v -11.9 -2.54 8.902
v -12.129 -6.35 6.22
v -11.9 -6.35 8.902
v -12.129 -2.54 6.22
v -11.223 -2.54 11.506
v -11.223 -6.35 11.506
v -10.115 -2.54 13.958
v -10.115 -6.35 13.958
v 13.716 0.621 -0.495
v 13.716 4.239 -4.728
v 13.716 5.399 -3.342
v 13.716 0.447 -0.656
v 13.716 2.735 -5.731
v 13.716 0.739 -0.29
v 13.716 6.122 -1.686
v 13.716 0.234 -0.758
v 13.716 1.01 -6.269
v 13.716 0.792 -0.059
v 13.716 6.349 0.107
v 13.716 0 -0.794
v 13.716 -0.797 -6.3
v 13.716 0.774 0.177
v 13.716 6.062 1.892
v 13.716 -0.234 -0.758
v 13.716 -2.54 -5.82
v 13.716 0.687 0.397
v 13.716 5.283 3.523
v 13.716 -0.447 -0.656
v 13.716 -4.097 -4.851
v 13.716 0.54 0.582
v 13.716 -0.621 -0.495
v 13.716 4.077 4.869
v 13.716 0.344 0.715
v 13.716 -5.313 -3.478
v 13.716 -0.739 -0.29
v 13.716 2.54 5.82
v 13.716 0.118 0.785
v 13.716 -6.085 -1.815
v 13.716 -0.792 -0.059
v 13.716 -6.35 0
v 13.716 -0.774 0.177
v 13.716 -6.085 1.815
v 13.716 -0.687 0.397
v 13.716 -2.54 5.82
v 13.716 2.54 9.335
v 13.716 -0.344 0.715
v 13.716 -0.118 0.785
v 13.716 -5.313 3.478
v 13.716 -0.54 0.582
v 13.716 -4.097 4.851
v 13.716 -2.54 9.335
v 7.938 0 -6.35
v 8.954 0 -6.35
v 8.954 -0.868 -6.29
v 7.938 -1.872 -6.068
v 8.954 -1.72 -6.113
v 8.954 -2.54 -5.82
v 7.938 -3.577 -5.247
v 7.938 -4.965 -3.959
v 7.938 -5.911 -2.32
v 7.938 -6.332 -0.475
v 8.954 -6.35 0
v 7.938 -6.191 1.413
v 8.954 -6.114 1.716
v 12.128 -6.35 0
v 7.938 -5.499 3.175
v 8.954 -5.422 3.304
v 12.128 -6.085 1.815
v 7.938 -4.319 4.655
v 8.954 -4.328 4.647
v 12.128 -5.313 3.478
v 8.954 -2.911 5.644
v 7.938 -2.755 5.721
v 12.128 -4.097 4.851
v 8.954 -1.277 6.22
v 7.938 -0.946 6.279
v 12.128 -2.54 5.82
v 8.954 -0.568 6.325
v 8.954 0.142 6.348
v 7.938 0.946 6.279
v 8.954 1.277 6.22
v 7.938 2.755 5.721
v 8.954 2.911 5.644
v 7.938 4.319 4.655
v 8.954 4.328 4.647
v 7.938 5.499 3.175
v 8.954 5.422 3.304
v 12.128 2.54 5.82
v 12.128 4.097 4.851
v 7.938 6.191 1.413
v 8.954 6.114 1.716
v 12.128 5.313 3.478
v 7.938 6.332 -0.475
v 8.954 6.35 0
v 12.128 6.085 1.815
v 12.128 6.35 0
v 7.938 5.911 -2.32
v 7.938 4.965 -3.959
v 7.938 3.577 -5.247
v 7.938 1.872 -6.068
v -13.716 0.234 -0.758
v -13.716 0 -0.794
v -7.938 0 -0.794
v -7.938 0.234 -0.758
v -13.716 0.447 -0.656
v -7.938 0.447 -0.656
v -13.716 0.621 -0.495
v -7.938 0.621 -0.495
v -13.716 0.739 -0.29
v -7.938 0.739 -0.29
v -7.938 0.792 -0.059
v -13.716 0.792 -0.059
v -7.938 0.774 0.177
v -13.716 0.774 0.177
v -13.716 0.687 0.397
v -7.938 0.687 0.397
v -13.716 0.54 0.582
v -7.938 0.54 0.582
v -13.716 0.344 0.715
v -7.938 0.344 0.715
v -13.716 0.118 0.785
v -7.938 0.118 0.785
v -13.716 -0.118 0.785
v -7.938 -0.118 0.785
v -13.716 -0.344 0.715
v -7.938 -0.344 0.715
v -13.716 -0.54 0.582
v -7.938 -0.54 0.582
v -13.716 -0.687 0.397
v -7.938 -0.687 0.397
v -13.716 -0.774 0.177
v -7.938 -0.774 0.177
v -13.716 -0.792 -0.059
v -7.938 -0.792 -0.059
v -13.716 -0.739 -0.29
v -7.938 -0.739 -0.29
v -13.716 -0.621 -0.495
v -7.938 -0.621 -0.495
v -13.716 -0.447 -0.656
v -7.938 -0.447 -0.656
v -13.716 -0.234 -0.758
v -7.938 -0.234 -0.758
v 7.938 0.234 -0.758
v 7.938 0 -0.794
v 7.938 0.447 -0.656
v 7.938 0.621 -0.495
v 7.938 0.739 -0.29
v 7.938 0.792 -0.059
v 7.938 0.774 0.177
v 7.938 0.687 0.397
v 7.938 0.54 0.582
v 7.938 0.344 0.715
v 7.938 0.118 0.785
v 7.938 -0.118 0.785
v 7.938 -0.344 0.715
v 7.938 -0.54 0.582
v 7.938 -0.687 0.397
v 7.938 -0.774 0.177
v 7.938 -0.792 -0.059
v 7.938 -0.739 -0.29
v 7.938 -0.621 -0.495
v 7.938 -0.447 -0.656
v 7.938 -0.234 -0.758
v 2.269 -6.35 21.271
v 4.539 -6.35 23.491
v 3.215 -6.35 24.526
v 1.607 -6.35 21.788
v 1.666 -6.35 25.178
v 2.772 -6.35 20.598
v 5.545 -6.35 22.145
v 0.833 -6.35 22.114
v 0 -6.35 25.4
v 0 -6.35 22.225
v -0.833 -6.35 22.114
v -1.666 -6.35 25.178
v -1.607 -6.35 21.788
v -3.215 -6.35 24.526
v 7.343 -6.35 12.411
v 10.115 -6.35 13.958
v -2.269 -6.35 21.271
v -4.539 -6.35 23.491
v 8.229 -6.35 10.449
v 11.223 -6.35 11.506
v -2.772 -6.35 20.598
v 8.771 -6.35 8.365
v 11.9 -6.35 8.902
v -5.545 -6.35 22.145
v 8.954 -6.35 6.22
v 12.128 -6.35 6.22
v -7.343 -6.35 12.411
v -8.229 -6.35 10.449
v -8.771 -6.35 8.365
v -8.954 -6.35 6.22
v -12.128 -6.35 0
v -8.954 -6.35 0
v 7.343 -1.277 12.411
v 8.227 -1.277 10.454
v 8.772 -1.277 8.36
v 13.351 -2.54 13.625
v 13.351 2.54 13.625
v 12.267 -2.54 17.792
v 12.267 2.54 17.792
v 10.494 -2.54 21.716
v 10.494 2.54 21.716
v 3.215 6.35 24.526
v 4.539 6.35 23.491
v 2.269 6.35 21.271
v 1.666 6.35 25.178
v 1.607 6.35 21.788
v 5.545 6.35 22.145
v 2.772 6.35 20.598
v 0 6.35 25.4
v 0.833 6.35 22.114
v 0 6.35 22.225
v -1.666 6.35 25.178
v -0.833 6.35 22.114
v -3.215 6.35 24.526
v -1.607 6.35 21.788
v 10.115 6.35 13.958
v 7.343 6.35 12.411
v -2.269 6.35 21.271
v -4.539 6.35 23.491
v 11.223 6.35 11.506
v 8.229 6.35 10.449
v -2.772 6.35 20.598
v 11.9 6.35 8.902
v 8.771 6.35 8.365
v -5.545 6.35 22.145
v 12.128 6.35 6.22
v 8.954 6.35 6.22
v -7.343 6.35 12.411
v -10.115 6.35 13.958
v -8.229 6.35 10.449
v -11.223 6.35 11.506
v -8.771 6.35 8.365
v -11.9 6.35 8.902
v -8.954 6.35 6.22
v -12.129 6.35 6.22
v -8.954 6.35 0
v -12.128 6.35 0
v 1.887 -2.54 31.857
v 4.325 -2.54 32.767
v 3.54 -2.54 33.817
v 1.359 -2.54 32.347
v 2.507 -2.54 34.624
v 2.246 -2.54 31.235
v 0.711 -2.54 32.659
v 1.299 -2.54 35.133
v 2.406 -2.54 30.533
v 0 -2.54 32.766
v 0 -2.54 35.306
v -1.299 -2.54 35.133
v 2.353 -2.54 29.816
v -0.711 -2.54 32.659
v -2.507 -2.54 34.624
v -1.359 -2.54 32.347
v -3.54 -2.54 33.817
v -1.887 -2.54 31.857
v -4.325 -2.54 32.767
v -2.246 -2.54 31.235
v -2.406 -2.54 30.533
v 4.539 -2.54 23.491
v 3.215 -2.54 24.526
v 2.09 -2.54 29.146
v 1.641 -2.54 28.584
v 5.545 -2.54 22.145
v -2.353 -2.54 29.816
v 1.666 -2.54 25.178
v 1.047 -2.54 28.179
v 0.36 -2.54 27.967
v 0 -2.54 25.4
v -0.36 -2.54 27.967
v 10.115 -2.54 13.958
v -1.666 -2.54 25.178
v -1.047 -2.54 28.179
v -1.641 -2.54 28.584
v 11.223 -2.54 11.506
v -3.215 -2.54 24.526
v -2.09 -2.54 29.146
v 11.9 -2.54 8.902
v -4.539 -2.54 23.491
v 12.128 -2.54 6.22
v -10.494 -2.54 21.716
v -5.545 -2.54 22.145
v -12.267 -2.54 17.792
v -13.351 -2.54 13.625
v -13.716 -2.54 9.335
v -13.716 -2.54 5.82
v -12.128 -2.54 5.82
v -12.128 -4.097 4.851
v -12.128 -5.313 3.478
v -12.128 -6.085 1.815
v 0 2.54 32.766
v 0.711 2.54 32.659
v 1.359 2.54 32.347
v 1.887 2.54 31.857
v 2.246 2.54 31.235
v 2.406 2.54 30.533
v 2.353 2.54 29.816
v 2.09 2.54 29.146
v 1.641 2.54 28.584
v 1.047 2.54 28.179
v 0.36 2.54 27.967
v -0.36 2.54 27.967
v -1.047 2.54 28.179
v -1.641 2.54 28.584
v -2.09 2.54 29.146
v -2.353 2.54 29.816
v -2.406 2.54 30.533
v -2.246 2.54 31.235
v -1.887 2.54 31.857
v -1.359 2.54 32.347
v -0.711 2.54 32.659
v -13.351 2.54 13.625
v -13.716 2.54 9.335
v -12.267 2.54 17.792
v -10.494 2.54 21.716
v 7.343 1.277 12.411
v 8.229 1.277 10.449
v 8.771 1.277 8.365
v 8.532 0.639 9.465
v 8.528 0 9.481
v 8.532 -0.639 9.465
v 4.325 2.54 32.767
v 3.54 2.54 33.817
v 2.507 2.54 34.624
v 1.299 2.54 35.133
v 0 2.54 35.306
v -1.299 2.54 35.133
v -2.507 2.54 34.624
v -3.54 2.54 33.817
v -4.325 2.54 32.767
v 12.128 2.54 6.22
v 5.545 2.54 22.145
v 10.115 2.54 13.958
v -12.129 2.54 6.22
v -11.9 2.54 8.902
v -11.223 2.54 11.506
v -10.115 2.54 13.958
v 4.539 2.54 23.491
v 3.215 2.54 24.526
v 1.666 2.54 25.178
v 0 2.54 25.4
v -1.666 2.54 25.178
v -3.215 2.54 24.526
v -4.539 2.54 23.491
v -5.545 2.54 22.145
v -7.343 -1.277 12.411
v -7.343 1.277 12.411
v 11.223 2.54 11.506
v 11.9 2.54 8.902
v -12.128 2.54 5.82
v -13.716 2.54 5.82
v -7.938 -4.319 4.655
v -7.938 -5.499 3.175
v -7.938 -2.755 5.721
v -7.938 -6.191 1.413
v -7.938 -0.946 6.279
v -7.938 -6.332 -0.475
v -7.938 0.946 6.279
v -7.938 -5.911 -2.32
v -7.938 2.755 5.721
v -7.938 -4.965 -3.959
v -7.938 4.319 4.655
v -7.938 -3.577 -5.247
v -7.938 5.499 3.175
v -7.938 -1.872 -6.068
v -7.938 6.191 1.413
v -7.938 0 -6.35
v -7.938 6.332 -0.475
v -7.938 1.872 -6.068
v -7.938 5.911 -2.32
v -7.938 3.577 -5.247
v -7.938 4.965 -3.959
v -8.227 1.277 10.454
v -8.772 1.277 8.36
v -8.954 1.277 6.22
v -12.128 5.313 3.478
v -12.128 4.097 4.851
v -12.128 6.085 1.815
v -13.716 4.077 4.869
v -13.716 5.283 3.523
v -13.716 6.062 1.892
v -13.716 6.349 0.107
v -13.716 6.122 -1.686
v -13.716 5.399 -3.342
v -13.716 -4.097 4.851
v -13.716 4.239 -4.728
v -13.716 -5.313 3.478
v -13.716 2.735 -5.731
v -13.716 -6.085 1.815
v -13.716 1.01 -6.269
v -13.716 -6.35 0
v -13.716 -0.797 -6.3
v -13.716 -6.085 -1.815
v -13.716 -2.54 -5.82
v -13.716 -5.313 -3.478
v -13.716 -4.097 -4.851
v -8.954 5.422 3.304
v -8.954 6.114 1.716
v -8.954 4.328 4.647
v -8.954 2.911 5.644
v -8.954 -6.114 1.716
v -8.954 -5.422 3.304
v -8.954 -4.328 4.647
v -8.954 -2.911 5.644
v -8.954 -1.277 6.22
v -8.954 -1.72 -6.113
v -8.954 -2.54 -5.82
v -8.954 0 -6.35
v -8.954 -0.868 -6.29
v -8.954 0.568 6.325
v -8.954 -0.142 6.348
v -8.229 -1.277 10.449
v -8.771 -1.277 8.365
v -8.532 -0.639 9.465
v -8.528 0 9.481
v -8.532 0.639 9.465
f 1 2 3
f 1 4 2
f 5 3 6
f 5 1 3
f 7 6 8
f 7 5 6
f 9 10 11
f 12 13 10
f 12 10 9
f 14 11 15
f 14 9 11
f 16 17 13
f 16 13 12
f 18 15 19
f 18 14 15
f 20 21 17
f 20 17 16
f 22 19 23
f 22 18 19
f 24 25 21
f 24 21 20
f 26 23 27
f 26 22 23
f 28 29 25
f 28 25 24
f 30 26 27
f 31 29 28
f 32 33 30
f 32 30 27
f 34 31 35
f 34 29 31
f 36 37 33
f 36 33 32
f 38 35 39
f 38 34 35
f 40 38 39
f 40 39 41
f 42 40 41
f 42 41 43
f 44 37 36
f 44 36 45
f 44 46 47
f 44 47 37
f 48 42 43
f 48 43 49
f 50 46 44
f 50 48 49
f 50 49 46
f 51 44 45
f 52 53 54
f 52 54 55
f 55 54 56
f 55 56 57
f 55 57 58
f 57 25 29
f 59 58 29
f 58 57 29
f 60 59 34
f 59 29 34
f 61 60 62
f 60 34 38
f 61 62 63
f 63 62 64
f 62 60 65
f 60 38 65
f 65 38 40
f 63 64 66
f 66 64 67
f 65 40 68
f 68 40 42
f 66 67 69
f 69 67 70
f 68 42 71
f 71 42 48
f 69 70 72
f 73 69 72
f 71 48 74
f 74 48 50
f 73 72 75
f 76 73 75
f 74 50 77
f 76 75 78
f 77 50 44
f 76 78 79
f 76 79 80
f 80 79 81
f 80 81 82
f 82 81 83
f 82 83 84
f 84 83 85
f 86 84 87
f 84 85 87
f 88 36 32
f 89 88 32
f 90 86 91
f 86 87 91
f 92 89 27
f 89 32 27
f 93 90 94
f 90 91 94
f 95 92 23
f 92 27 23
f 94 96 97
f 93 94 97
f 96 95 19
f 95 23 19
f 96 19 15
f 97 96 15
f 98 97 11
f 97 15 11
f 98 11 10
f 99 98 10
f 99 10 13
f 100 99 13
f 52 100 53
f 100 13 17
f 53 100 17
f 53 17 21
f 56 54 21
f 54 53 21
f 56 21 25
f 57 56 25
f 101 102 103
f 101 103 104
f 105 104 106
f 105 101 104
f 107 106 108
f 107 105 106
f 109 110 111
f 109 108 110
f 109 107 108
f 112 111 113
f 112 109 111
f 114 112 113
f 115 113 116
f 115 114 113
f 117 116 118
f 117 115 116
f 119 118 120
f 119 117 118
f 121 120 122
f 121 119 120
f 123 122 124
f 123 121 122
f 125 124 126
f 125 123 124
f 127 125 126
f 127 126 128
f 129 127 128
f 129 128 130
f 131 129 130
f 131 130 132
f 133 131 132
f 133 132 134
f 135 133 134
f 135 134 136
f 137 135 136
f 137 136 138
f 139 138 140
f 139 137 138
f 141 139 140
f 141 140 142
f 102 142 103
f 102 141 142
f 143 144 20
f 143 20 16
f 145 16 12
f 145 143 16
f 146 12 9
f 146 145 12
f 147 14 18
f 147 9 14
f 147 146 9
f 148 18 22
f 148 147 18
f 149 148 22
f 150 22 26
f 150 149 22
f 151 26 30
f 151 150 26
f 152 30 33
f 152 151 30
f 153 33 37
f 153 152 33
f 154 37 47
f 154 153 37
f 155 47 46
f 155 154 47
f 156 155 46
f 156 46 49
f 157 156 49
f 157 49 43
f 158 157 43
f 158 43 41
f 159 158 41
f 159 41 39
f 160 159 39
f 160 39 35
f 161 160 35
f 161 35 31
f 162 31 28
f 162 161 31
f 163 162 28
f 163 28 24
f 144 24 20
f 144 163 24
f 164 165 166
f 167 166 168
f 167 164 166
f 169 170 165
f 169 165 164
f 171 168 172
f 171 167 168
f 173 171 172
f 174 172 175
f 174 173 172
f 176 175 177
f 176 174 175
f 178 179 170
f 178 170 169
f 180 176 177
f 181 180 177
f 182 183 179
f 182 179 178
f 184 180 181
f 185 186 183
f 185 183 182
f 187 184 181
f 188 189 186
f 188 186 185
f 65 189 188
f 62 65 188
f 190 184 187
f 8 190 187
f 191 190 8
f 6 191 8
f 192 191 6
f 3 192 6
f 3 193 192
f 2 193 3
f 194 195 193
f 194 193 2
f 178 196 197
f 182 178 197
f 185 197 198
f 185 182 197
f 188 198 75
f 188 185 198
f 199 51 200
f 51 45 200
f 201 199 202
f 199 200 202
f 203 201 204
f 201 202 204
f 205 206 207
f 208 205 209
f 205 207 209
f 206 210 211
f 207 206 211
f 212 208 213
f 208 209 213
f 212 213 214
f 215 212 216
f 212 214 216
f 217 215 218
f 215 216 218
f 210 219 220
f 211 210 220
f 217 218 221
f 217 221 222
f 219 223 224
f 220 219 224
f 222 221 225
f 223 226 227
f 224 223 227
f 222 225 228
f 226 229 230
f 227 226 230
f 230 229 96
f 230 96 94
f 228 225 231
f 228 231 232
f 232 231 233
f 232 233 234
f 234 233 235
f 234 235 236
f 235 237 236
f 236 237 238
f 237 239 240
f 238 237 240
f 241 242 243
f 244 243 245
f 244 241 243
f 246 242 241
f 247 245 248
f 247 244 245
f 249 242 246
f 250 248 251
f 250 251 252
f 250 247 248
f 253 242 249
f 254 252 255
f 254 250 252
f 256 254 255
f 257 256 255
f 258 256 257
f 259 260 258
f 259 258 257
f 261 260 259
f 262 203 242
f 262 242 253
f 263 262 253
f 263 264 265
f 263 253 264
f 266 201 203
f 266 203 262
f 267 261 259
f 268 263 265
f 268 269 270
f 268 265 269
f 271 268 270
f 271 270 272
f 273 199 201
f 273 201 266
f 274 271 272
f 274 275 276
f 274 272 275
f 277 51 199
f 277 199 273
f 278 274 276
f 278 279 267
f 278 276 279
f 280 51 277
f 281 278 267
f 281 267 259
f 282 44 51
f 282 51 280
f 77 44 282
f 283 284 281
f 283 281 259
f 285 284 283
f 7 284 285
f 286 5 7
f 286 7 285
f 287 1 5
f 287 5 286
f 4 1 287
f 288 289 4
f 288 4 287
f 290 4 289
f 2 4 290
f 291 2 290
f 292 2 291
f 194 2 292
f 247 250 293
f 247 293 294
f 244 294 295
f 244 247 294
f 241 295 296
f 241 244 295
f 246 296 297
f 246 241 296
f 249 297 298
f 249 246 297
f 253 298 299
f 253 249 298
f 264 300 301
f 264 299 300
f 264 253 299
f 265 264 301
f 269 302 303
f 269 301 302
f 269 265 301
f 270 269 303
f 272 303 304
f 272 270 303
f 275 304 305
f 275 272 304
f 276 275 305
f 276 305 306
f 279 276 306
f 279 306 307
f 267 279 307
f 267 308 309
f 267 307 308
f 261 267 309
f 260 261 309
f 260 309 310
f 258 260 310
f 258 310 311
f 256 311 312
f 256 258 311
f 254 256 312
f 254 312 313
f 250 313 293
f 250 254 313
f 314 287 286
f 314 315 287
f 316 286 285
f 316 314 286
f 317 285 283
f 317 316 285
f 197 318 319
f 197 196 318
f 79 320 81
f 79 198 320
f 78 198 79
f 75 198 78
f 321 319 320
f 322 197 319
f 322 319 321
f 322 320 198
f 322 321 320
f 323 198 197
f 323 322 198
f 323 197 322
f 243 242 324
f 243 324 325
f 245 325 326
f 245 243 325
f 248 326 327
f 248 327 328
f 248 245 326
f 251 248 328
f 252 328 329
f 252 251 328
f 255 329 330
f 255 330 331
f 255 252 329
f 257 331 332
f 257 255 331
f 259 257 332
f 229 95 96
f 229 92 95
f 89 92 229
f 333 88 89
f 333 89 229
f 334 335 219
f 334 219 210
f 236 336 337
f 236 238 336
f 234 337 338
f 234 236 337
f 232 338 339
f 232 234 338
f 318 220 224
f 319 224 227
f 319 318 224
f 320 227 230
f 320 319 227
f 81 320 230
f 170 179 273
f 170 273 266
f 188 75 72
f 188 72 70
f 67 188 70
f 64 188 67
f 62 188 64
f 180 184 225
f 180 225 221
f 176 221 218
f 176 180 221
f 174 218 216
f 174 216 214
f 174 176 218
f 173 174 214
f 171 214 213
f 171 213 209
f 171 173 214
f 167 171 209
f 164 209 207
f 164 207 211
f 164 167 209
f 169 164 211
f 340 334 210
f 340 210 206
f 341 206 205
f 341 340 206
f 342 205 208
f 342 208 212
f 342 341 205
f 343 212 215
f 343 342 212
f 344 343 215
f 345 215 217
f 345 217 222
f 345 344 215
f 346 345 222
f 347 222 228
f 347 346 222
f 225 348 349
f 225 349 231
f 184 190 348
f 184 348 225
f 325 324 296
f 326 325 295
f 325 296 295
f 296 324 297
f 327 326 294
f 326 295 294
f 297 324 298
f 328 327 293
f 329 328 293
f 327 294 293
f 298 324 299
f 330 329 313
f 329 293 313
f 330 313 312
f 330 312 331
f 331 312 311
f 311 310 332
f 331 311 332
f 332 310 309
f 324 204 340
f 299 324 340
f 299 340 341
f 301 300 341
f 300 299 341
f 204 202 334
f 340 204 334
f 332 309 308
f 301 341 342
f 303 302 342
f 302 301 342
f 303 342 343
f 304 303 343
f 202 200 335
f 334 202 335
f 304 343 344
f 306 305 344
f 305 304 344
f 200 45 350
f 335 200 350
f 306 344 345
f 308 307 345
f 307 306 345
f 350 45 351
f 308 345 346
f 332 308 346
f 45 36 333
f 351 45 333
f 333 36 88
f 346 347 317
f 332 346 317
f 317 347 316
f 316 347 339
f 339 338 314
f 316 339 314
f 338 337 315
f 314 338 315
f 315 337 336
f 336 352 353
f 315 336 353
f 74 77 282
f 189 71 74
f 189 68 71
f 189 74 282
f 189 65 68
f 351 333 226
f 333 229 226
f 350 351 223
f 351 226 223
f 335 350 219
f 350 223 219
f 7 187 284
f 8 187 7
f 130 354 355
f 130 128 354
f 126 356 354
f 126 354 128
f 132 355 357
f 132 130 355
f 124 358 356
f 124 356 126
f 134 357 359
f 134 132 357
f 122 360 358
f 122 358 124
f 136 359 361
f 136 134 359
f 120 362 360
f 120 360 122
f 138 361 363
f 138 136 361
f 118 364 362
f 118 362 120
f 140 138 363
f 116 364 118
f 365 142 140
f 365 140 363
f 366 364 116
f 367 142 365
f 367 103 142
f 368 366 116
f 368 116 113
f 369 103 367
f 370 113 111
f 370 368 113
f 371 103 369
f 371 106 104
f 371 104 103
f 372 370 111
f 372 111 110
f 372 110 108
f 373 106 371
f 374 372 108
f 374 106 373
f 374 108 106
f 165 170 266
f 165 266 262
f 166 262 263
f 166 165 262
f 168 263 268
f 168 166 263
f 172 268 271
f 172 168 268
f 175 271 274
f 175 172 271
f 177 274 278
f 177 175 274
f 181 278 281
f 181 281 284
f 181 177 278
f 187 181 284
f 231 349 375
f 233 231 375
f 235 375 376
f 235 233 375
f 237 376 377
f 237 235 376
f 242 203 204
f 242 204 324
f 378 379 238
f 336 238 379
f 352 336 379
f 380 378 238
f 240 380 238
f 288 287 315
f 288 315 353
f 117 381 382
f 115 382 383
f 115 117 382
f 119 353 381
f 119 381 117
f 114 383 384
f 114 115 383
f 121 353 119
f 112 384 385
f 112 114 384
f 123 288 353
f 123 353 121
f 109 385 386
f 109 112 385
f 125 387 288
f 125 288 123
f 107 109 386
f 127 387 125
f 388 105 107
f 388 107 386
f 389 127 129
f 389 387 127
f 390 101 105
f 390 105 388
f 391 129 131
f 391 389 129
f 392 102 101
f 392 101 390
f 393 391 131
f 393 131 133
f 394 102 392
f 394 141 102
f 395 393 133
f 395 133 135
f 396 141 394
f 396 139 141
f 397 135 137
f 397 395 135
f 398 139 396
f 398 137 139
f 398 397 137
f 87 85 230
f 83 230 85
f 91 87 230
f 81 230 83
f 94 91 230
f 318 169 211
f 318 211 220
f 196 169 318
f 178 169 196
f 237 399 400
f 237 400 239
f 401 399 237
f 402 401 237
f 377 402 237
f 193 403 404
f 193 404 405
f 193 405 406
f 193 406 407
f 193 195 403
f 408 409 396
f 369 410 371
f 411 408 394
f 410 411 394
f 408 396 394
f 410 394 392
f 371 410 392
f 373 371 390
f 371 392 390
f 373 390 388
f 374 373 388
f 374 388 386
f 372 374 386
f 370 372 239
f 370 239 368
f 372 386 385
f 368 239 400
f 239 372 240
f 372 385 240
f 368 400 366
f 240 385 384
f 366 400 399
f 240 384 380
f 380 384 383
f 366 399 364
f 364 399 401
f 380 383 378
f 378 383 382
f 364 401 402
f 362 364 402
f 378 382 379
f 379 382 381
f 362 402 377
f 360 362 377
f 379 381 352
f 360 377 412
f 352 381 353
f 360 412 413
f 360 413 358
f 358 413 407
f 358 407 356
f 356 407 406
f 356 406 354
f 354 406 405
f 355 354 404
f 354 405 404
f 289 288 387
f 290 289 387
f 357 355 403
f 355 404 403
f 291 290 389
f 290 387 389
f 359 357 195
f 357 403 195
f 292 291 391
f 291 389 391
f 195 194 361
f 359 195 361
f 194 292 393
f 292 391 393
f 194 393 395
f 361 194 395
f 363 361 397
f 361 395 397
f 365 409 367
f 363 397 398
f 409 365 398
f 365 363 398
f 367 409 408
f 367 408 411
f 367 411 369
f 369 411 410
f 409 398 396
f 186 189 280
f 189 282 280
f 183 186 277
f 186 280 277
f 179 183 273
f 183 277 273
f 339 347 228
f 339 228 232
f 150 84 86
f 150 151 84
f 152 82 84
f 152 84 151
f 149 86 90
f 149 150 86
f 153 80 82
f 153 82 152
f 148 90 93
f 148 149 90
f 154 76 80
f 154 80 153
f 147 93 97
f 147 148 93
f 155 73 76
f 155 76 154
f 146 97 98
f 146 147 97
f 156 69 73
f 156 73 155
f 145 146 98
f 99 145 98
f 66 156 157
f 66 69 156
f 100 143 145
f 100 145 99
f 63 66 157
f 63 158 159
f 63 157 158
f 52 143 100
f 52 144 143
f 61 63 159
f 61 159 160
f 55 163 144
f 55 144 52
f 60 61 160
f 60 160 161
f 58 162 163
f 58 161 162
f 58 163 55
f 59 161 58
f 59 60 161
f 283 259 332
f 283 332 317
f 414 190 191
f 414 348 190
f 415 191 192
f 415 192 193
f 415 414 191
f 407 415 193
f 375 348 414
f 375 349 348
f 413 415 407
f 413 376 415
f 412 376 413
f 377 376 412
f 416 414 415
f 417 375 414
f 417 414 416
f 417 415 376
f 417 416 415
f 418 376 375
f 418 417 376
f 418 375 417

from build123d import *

# Parameters (mm, degrees)
BOSS_EXTRUDE1_DEPTH             = 2.54
BOSS_EXTRUDE1_DEPTH_BACK        = 2.54
BOSS_EXTRUDE2_REACH             = 44.034
SKETCH2_R                       = 6.35
BOSS_EXTRUDE2_DIRECTION_2_DEPTH = 1.016
BOSS_EXTRUDE3_DEPTH             = 1.016
BOSS_EXTRUDE3_DEPTH_BACK        = 4.7625
SKETCH3_R                       = 6.35
CUT_EXTRUDE1_DEPTH              = 46.159171383
CUT_EXTRUDE1_DEPTH_BACK         = 46.159171383
BOSS_EXTRUDE4_DEPTH             = 6.35
BOSS_EXTRUDE4_DEPTH_BACK        = 6.35
CUT_EXTRUDE2_DEPTH              = 46.159171383
CUT_EXTRUDE2_DEPTH_BACK         = 46.159171383
SKETCH7_R                       = 0.79375
FILLET1_R                       = 12.7
FILLET2_R                       = 15.875
FILLET3_R                       = 25.4
CUT_EXTRUDE3_DEPTH              = 39.905968649
CUT_EXTRUDE3_DEPTH_BACK         = 39.905968649
SKETCH8_R                       = 2.413


with BuildPart() as part:
    # Sketch1 → Boss-Extrude1 (new, two sides: drawn at the far end of the back side and taken through both)
    with BuildSketch(Plane(origin=(0, 0, 0), x_dir=(1, 0, 0), z_dir=(0, 1, 0)).offset(-BOSS_EXTRUDE1_DEPTH_BACK)):
        with BuildLine():
            Line((-13.716, 6.35), (-8.9535, 6.35))
            Line((-8.9535, 6.35), (-8.9535, -9.525))
            Line((-8.9535, -9.525), (-2.772279089, -20.597609011))
            ThreePointArc((-2.772279089, -20.597609011), (0, -22.225), (2.772279089, -20.597609011))
            Line((2.772279089, -20.597609011), (8.9535, -9.525))
            Line((8.9535, -9.525), (8.9535, 6.35))
            Line((8.9535, 6.35), (13.716, 6.35))
            Line((13.716, 6.35), (13.716, -15.944447946))
            Line((13.716, -15.944447946), (4.32475538, -32.767270057))
            ThreePointArc((4.32475538, -32.767270057), (0, -35.306), (-4.32475538, -32.767270057))
            Line((-4.32475538, -32.767270057), (-13.716, -15.944447946))
            Line((-13.716, -15.944447946), (-13.716, 6.35))
        make_face()
    extrude(amount=BOSS_EXTRUDE1_DEPTH + BOSS_EXTRUDE1_DEPTH_BACK)

    # Boss-Extrude2: up to this face of the body (flat: up to its plane)
    boss_extrude2_end = Plane(part.part.faces().sort_by_distance((-13.716, 0, 4.797223973))[0])
    # Sketch2 → Boss-Extrude2 (add, up to the picked face)
    with BuildSketch(Plane(origin=(-8.9535, 0, 0), x_dir=(0, 0, -1), z_dir=(1, 0, 0)), mode=Mode.PRIVATE) as boss_extrude2_sk1:
        Circle(SKETCH2_R)
    boss_extrude2_tool1 = split(extrude(boss_extrude2_sk1.sketch, amount=-BOSS_EXTRUDE2_REACH, mode=Mode.PRIVATE), bisect_by=boss_extrude2_end, keep=Keep.BOTH, mode=Mode.PRIVATE)
    add(boss_extrude2_tool1.solids().sort_by(Axis((-8.9535, 0, 0), (-1, 0, 0)))[0])

    # Sketch2 → Boss-Extrude2 direction 2 (add)
    with BuildSketch(Plane(origin=(-8.9535, 0, 0), x_dir=(0, 0, -1), z_dir=(1, 0, 0))):
        Circle(SKETCH2_R)
    extrude(amount=BOSS_EXTRUDE2_DIRECTION_2_DEPTH)

    # Sketch3 → Boss-Extrude3 (add, two sides: drawn at the far end of the back side and taken through both)
    with BuildSketch(Plane.ZY.offset(-8.9535).offset(-BOSS_EXTRUDE3_DEPTH_BACK)):
        with Locations(Location((0, 0, 0), (0, 0, 180))):
            Circle(SKETCH3_R)
    extrude(amount=BOSS_EXTRUDE3_DEPTH + BOSS_EXTRUDE3_DEPTH_BACK)

    # Sketch4 → Cut-Extrude1 (cut, two sides: drawn at the far end of the back side and taken through both)
    with BuildSketch(Plane(origin=(13.716, 0, 0), x_dir=(0, 0, -1), z_dir=(1, 0, 0)).offset(-CUT_EXTRUDE1_DEPTH_BACK)):
        with BuildLine():
            Line((3.81, 5.08), (13.97, 5.08))
            Line((13.97, 5.08), (13.97, -5.08))
            Line((13.97, -5.08), (3.81, -5.08))
            ThreePointArc((3.81, -5.08), (6.35, 0), (3.81, 5.08))
        make_face()
    extrude(amount=CUT_EXTRUDE1_DEPTH + CUT_EXTRUDE1_DEPTH_BACK, mode=Mode.SUBTRACT)

    # Sketch6 → Boss-Extrude4 (add, two sides: drawn at the far end of the back side and taken through both)
    with BuildSketch(Plane(origin=(0, 0, 0), x_dir=(1, 0, 0), z_dir=(0, 1, 0)).offset(-BOSS_EXTRUDE4_DEPTH_BACK)):
        with BuildLine():
            Line((-8.9535, -9.525), (-2.772279089, -20.597609011))
            ThreePointArc((-2.772279089, -20.597609011), (0, -22.225), (2.772279089, -20.597609011))
            Line((2.772279089, -20.597609011), (8.9535, -9.525))
            Line((8.9535, -9.525), (8.9535, 0))
            Line((8.9535, 0), (12.1285, 0))
            Line((12.1285, 0), (12.1285, -10.351202795))
            Line((12.1285, -10.351202795), (5.544558179, -22.145218022))
            ThreePointArc((5.544558179, -22.145218022), (0, -25.4), (-5.544558179, -22.145218022))
            Line((-5.544558179, -22.145218022), (-12.1285, -10.351202795))
            Line((-12.1285, -10.351202795), (-12.1285, 0))
            Line((-12.1285, 0), (-8.9535, 0))
            Line((-8.9535, 0), (-8.9535, -9.525))
        make_face()
    extrude(amount=BOSS_EXTRUDE4_DEPTH + BOSS_EXTRUDE4_DEPTH_BACK)

    # Sketch7 → Cut-Extrude2 (cut, two sides: drawn at the far end of the back side and taken through both)
    with BuildSketch(Plane(origin=(13.716, 0, 0), x_dir=(0, 0, -1), z_dir=(1, 0, 0)).offset(-CUT_EXTRUDE2_DEPTH_BACK)):
        Circle(SKETCH7_R)
    extrude(amount=CUT_EXTRUDE2_DEPTH + CUT_EXTRUDE2_DEPTH_BACK, mode=Mode.SUBTRACT)

    # Fillet1
    fillet1_edges = [part.edges().sort_by_distance(p)[0] for p in [
        (-8.9535, 0, 9.525),
        (8.9535, 0, 9.525),
    ]]
    fillet(fillet1_edges, radius=FILLET1_R)

    # Fillet2
    fillet2_edges = [part.edges().sort_by_distance(p)[0] for p in [
        (-12.1285, -4.445, 10.351202795),
        (12.1285, -4.445, 10.351202795),
        (-12.1285, 4.445, 10.351202795),
        (12.1285, 4.445, 10.351202795),
    ]]
    fillet(fillet2_edges, radius=FILLET2_R)

    # Fillet3
    fillet3_edges = [part.edges().sort_by_distance(p)[0] for p in [
        (13.716, 0, 15.944447946),
        (-13.716, 0, 15.944447946),
    ]]
    fillet(fillet3_edges, radius=FILLET3_R)

    # Sketch8 → Cut-Extrude3 (cut, two sides: drawn at the far end of the back side and taken through both)
    with BuildSketch(Plane(origin=(0, 2.54, 0), x_dir=(1, 0, 0), z_dir=(0, 1, 0)).offset(-CUT_EXTRUDE3_DEPTH_BACK)):
        with Locations(Location((0, -30.353, 0), (0, 0, 270))):
            Circle(SKETCH8_R)
    extrude(amount=CUT_EXTRUDE3_DEPTH + CUT_EXTRUDE3_DEPTH_BACK, mode=Mode.SUBTRACT)


solid = part.part
